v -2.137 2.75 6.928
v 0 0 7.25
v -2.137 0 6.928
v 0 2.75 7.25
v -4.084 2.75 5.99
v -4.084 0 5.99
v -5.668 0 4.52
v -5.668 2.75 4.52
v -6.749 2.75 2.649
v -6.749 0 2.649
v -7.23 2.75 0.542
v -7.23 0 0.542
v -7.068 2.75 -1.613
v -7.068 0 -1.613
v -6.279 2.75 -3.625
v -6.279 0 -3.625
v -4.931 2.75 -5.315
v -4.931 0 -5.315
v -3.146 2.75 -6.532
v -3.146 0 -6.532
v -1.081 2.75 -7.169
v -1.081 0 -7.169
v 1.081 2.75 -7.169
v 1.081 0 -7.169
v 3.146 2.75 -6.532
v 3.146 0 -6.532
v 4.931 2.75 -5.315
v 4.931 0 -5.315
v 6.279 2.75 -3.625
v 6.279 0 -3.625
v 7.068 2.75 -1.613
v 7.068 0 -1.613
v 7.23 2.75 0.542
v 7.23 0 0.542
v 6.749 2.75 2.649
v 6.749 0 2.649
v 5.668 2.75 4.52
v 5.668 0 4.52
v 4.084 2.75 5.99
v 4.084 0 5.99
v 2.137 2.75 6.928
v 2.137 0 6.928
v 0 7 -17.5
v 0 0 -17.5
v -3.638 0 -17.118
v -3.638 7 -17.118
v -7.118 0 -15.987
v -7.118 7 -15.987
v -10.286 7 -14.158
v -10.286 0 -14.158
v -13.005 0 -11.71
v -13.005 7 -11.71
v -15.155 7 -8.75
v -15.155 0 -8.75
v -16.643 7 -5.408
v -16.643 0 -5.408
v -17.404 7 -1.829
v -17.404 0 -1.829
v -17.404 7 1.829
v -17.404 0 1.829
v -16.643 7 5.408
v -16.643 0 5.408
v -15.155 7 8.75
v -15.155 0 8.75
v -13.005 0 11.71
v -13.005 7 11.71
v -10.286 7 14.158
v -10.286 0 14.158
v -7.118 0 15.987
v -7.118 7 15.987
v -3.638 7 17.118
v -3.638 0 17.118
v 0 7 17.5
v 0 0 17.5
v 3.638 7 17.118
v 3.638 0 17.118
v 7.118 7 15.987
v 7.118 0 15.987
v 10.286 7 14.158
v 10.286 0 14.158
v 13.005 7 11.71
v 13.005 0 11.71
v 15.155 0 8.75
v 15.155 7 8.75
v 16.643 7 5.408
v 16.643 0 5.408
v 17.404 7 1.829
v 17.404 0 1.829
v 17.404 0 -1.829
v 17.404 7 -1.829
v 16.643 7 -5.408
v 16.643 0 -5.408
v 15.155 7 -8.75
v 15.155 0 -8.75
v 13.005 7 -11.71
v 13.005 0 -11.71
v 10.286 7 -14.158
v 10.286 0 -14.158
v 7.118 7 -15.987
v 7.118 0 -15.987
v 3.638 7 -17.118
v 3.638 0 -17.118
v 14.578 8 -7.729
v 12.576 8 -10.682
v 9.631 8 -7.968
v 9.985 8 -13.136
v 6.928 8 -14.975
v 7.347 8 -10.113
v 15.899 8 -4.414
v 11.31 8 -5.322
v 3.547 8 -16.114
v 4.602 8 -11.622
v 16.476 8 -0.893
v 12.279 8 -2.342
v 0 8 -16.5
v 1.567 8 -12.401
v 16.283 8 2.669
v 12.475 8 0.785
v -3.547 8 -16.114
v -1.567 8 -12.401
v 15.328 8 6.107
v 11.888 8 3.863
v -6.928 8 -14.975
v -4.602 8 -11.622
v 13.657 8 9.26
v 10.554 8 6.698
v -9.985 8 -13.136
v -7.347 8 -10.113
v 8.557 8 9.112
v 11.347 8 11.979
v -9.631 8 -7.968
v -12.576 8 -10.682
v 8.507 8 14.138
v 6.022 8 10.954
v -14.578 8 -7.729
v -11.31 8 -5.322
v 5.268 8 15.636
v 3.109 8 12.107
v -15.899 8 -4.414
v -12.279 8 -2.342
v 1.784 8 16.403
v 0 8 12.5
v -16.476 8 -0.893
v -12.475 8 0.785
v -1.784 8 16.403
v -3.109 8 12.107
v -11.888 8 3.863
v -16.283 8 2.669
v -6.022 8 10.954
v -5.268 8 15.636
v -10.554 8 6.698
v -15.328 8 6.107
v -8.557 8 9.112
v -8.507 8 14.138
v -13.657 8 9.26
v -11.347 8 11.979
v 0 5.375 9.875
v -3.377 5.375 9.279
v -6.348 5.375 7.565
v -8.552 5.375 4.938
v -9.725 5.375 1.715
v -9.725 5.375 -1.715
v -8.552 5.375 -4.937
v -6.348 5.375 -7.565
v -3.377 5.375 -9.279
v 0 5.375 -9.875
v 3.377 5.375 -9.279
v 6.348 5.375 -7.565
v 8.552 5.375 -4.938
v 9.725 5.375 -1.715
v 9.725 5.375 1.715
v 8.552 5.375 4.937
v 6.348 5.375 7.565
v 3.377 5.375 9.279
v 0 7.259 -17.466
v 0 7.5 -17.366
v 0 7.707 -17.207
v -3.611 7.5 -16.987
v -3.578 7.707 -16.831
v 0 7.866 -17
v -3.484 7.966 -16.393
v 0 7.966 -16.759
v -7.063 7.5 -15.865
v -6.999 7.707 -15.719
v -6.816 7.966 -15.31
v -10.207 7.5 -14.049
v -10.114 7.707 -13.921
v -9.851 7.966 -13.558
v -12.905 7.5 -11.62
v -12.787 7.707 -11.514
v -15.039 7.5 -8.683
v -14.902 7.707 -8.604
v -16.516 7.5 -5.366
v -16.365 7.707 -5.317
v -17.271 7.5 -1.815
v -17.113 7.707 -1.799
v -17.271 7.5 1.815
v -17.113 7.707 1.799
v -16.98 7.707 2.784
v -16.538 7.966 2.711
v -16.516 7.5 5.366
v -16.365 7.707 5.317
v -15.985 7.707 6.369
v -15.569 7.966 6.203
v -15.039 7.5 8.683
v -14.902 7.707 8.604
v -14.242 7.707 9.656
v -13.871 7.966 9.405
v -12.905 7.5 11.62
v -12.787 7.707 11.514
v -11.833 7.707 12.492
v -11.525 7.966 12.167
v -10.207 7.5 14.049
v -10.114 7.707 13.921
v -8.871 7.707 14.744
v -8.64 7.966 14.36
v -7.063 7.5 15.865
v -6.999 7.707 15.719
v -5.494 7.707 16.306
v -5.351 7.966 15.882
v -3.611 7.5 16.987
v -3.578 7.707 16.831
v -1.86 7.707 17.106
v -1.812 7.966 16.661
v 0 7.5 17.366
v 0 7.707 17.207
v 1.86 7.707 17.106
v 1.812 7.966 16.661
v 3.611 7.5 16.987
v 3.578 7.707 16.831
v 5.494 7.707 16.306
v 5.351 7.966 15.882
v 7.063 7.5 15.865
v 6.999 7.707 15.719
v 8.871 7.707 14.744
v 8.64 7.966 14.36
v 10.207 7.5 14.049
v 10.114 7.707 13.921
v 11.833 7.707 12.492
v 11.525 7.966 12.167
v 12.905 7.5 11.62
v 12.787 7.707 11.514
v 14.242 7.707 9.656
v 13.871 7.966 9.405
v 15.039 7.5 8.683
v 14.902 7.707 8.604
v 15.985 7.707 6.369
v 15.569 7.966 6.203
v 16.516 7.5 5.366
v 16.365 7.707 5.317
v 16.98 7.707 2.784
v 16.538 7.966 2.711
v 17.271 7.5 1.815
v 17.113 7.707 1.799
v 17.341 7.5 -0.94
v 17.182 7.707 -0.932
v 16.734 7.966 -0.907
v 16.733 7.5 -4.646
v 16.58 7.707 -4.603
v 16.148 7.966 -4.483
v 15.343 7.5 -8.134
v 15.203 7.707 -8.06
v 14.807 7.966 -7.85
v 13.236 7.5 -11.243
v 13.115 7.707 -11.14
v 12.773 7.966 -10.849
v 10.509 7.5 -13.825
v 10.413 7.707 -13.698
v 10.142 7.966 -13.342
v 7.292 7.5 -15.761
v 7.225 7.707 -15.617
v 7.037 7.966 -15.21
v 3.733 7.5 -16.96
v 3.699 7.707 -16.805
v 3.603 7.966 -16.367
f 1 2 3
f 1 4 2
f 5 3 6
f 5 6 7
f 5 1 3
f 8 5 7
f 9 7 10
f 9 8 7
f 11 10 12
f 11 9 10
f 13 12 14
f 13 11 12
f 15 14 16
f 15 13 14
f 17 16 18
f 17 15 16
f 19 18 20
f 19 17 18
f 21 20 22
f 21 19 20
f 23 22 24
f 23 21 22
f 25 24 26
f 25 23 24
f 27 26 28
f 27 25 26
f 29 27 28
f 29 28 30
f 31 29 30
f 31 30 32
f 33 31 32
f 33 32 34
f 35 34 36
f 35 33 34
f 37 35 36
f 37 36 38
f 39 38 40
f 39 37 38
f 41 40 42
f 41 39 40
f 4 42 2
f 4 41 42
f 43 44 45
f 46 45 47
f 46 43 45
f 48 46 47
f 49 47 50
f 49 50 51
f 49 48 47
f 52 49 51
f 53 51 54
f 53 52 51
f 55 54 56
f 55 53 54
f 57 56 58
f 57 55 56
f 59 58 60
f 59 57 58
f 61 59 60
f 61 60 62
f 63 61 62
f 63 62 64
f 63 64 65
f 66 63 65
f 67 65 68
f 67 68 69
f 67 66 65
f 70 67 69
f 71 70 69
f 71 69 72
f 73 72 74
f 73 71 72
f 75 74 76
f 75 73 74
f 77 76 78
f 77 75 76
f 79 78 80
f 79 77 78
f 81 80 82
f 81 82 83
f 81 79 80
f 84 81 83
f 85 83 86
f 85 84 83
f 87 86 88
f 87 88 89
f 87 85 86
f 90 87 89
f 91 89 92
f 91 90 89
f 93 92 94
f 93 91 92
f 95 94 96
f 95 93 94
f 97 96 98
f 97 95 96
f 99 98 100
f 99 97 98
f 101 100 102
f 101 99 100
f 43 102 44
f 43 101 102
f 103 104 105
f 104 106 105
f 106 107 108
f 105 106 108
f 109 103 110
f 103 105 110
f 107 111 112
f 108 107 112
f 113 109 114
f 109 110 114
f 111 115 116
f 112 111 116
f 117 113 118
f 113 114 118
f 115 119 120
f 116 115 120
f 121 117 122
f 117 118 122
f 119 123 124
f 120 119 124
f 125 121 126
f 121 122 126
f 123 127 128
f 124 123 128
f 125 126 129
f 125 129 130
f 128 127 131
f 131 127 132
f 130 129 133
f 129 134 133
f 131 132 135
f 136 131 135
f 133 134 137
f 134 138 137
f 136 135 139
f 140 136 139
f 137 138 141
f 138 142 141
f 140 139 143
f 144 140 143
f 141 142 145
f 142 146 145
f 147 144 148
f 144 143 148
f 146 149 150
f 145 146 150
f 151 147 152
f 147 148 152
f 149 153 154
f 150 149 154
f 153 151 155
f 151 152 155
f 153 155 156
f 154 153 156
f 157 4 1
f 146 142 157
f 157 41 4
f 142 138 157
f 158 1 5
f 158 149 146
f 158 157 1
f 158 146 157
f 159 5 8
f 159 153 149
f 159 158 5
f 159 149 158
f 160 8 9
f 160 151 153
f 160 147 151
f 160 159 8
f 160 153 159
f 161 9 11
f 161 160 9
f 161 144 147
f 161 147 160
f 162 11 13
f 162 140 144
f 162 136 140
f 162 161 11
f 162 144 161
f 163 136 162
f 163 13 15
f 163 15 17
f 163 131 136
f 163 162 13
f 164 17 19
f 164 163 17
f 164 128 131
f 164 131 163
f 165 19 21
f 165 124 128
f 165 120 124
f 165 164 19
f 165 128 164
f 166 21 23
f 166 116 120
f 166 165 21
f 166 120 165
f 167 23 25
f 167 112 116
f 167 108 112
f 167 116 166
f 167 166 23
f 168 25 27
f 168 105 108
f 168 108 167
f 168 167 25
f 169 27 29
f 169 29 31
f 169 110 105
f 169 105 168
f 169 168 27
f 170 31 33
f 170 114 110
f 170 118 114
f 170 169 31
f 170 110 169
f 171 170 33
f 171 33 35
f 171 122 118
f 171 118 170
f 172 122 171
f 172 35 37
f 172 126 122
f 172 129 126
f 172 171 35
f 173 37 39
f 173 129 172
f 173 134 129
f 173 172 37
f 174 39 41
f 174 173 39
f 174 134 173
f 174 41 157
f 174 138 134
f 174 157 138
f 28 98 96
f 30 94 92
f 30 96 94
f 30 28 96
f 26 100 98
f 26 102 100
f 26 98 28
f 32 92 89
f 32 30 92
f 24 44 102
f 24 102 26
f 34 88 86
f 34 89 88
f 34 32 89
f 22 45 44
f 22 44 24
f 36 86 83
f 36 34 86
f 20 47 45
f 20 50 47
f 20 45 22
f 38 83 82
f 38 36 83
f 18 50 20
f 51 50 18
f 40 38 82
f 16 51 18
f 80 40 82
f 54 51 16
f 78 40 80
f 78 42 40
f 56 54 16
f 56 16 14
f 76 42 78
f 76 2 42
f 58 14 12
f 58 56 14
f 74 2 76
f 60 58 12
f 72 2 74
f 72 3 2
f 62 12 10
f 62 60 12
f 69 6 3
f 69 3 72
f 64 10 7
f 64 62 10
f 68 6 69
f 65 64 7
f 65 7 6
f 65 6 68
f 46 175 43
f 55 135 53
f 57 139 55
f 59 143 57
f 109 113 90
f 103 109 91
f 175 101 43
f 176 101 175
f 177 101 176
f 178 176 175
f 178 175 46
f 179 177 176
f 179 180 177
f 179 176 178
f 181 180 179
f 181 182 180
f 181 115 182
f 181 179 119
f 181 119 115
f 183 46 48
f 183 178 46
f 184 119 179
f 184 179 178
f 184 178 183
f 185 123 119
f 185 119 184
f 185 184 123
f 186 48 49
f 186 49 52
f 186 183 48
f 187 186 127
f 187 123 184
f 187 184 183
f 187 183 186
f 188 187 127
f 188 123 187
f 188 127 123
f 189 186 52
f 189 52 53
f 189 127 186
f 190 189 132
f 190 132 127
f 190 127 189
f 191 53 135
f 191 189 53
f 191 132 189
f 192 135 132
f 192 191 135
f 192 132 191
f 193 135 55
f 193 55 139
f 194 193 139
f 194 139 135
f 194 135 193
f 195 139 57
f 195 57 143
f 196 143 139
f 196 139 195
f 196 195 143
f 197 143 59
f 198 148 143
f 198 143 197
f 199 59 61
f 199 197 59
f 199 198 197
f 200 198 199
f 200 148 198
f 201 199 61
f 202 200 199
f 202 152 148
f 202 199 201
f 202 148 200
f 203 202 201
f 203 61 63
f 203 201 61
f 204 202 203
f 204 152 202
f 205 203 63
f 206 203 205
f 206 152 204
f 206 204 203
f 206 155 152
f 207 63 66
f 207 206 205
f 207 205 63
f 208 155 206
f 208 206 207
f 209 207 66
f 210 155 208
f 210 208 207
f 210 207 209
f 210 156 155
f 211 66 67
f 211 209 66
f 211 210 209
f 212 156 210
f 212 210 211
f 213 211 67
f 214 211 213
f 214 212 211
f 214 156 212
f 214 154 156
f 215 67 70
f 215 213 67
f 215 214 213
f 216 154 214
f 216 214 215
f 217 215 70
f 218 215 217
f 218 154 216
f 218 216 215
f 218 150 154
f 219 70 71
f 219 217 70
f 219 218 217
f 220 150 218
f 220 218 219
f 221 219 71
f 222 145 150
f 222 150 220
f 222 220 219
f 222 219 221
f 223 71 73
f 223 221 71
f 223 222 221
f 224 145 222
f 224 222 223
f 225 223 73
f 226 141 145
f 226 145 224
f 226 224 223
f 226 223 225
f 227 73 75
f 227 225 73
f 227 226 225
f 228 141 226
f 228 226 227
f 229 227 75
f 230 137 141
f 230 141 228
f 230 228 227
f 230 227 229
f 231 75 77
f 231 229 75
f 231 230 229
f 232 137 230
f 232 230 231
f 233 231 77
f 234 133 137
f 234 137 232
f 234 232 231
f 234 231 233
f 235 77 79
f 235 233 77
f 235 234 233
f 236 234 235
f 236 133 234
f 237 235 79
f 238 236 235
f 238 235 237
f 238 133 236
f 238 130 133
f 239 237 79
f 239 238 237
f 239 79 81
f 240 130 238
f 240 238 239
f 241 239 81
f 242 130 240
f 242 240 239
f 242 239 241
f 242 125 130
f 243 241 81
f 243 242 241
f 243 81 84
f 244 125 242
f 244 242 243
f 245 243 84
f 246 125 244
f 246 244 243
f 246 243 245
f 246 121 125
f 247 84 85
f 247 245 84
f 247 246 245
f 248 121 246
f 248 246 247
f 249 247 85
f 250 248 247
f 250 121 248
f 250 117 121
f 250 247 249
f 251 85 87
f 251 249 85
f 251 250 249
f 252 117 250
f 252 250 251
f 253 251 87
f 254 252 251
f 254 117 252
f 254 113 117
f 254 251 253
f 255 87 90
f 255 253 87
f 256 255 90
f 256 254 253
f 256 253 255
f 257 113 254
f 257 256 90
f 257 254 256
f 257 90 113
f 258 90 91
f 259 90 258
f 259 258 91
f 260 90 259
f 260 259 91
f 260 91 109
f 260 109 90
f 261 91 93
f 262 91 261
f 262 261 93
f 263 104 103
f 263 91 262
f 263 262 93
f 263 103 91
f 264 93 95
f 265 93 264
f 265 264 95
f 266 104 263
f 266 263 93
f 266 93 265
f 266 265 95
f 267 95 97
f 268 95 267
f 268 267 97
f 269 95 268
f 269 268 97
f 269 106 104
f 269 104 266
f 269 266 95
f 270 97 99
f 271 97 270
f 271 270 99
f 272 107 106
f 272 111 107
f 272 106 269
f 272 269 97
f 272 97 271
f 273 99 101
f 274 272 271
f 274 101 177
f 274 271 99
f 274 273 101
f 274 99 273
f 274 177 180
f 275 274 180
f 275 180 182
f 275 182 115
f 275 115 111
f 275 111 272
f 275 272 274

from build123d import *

# Parameters (mm, degrees)
SKETCH1_W = 17.5
SKETCH1_H = 8
FILLET1_R = 1


with BuildPart() as part:
    # Sketch1 → Revolve1 (revolve)
    with BuildSketch(Plane.XY, mode=Mode.PRIVATE) as revolve1_sk:
        with Locations((8.75, 4)):
            Rectangle(SKETCH1_W, SKETCH1_H)
    revolve(revolve1_sk.sketch.rotate(Axis((0, 0, 0), (0, 1, 0)), 90), axis=Axis((0, 0, 0), (0, 1, 0)))

    # Sketch2 → CSK for M3 Countersunk Flat Head Screw1 (revolve, cut)
    with BuildSketch(Plane(origin=(0, 8, 0), x_dir=(0, 0, 1), z_dir=(1, 0, 0))):
        Polygon((0, 0), (0, 8), (7.25, 8), (7.25, 5.25), (12.5, 0), align=None)
    revolve(axis=Axis((0, 14.35, 0), (0, -1, 0)), mode=Mode.SUBTRACT)

    # Fillet1
    fillet1_edges = [part.edges().sort_by_distance(p)[0] for p in [
        (0, 8, 17.5),
    ]]
    fillet(fillet1_edges, radius=FILLET1_R)


solid = part.part
